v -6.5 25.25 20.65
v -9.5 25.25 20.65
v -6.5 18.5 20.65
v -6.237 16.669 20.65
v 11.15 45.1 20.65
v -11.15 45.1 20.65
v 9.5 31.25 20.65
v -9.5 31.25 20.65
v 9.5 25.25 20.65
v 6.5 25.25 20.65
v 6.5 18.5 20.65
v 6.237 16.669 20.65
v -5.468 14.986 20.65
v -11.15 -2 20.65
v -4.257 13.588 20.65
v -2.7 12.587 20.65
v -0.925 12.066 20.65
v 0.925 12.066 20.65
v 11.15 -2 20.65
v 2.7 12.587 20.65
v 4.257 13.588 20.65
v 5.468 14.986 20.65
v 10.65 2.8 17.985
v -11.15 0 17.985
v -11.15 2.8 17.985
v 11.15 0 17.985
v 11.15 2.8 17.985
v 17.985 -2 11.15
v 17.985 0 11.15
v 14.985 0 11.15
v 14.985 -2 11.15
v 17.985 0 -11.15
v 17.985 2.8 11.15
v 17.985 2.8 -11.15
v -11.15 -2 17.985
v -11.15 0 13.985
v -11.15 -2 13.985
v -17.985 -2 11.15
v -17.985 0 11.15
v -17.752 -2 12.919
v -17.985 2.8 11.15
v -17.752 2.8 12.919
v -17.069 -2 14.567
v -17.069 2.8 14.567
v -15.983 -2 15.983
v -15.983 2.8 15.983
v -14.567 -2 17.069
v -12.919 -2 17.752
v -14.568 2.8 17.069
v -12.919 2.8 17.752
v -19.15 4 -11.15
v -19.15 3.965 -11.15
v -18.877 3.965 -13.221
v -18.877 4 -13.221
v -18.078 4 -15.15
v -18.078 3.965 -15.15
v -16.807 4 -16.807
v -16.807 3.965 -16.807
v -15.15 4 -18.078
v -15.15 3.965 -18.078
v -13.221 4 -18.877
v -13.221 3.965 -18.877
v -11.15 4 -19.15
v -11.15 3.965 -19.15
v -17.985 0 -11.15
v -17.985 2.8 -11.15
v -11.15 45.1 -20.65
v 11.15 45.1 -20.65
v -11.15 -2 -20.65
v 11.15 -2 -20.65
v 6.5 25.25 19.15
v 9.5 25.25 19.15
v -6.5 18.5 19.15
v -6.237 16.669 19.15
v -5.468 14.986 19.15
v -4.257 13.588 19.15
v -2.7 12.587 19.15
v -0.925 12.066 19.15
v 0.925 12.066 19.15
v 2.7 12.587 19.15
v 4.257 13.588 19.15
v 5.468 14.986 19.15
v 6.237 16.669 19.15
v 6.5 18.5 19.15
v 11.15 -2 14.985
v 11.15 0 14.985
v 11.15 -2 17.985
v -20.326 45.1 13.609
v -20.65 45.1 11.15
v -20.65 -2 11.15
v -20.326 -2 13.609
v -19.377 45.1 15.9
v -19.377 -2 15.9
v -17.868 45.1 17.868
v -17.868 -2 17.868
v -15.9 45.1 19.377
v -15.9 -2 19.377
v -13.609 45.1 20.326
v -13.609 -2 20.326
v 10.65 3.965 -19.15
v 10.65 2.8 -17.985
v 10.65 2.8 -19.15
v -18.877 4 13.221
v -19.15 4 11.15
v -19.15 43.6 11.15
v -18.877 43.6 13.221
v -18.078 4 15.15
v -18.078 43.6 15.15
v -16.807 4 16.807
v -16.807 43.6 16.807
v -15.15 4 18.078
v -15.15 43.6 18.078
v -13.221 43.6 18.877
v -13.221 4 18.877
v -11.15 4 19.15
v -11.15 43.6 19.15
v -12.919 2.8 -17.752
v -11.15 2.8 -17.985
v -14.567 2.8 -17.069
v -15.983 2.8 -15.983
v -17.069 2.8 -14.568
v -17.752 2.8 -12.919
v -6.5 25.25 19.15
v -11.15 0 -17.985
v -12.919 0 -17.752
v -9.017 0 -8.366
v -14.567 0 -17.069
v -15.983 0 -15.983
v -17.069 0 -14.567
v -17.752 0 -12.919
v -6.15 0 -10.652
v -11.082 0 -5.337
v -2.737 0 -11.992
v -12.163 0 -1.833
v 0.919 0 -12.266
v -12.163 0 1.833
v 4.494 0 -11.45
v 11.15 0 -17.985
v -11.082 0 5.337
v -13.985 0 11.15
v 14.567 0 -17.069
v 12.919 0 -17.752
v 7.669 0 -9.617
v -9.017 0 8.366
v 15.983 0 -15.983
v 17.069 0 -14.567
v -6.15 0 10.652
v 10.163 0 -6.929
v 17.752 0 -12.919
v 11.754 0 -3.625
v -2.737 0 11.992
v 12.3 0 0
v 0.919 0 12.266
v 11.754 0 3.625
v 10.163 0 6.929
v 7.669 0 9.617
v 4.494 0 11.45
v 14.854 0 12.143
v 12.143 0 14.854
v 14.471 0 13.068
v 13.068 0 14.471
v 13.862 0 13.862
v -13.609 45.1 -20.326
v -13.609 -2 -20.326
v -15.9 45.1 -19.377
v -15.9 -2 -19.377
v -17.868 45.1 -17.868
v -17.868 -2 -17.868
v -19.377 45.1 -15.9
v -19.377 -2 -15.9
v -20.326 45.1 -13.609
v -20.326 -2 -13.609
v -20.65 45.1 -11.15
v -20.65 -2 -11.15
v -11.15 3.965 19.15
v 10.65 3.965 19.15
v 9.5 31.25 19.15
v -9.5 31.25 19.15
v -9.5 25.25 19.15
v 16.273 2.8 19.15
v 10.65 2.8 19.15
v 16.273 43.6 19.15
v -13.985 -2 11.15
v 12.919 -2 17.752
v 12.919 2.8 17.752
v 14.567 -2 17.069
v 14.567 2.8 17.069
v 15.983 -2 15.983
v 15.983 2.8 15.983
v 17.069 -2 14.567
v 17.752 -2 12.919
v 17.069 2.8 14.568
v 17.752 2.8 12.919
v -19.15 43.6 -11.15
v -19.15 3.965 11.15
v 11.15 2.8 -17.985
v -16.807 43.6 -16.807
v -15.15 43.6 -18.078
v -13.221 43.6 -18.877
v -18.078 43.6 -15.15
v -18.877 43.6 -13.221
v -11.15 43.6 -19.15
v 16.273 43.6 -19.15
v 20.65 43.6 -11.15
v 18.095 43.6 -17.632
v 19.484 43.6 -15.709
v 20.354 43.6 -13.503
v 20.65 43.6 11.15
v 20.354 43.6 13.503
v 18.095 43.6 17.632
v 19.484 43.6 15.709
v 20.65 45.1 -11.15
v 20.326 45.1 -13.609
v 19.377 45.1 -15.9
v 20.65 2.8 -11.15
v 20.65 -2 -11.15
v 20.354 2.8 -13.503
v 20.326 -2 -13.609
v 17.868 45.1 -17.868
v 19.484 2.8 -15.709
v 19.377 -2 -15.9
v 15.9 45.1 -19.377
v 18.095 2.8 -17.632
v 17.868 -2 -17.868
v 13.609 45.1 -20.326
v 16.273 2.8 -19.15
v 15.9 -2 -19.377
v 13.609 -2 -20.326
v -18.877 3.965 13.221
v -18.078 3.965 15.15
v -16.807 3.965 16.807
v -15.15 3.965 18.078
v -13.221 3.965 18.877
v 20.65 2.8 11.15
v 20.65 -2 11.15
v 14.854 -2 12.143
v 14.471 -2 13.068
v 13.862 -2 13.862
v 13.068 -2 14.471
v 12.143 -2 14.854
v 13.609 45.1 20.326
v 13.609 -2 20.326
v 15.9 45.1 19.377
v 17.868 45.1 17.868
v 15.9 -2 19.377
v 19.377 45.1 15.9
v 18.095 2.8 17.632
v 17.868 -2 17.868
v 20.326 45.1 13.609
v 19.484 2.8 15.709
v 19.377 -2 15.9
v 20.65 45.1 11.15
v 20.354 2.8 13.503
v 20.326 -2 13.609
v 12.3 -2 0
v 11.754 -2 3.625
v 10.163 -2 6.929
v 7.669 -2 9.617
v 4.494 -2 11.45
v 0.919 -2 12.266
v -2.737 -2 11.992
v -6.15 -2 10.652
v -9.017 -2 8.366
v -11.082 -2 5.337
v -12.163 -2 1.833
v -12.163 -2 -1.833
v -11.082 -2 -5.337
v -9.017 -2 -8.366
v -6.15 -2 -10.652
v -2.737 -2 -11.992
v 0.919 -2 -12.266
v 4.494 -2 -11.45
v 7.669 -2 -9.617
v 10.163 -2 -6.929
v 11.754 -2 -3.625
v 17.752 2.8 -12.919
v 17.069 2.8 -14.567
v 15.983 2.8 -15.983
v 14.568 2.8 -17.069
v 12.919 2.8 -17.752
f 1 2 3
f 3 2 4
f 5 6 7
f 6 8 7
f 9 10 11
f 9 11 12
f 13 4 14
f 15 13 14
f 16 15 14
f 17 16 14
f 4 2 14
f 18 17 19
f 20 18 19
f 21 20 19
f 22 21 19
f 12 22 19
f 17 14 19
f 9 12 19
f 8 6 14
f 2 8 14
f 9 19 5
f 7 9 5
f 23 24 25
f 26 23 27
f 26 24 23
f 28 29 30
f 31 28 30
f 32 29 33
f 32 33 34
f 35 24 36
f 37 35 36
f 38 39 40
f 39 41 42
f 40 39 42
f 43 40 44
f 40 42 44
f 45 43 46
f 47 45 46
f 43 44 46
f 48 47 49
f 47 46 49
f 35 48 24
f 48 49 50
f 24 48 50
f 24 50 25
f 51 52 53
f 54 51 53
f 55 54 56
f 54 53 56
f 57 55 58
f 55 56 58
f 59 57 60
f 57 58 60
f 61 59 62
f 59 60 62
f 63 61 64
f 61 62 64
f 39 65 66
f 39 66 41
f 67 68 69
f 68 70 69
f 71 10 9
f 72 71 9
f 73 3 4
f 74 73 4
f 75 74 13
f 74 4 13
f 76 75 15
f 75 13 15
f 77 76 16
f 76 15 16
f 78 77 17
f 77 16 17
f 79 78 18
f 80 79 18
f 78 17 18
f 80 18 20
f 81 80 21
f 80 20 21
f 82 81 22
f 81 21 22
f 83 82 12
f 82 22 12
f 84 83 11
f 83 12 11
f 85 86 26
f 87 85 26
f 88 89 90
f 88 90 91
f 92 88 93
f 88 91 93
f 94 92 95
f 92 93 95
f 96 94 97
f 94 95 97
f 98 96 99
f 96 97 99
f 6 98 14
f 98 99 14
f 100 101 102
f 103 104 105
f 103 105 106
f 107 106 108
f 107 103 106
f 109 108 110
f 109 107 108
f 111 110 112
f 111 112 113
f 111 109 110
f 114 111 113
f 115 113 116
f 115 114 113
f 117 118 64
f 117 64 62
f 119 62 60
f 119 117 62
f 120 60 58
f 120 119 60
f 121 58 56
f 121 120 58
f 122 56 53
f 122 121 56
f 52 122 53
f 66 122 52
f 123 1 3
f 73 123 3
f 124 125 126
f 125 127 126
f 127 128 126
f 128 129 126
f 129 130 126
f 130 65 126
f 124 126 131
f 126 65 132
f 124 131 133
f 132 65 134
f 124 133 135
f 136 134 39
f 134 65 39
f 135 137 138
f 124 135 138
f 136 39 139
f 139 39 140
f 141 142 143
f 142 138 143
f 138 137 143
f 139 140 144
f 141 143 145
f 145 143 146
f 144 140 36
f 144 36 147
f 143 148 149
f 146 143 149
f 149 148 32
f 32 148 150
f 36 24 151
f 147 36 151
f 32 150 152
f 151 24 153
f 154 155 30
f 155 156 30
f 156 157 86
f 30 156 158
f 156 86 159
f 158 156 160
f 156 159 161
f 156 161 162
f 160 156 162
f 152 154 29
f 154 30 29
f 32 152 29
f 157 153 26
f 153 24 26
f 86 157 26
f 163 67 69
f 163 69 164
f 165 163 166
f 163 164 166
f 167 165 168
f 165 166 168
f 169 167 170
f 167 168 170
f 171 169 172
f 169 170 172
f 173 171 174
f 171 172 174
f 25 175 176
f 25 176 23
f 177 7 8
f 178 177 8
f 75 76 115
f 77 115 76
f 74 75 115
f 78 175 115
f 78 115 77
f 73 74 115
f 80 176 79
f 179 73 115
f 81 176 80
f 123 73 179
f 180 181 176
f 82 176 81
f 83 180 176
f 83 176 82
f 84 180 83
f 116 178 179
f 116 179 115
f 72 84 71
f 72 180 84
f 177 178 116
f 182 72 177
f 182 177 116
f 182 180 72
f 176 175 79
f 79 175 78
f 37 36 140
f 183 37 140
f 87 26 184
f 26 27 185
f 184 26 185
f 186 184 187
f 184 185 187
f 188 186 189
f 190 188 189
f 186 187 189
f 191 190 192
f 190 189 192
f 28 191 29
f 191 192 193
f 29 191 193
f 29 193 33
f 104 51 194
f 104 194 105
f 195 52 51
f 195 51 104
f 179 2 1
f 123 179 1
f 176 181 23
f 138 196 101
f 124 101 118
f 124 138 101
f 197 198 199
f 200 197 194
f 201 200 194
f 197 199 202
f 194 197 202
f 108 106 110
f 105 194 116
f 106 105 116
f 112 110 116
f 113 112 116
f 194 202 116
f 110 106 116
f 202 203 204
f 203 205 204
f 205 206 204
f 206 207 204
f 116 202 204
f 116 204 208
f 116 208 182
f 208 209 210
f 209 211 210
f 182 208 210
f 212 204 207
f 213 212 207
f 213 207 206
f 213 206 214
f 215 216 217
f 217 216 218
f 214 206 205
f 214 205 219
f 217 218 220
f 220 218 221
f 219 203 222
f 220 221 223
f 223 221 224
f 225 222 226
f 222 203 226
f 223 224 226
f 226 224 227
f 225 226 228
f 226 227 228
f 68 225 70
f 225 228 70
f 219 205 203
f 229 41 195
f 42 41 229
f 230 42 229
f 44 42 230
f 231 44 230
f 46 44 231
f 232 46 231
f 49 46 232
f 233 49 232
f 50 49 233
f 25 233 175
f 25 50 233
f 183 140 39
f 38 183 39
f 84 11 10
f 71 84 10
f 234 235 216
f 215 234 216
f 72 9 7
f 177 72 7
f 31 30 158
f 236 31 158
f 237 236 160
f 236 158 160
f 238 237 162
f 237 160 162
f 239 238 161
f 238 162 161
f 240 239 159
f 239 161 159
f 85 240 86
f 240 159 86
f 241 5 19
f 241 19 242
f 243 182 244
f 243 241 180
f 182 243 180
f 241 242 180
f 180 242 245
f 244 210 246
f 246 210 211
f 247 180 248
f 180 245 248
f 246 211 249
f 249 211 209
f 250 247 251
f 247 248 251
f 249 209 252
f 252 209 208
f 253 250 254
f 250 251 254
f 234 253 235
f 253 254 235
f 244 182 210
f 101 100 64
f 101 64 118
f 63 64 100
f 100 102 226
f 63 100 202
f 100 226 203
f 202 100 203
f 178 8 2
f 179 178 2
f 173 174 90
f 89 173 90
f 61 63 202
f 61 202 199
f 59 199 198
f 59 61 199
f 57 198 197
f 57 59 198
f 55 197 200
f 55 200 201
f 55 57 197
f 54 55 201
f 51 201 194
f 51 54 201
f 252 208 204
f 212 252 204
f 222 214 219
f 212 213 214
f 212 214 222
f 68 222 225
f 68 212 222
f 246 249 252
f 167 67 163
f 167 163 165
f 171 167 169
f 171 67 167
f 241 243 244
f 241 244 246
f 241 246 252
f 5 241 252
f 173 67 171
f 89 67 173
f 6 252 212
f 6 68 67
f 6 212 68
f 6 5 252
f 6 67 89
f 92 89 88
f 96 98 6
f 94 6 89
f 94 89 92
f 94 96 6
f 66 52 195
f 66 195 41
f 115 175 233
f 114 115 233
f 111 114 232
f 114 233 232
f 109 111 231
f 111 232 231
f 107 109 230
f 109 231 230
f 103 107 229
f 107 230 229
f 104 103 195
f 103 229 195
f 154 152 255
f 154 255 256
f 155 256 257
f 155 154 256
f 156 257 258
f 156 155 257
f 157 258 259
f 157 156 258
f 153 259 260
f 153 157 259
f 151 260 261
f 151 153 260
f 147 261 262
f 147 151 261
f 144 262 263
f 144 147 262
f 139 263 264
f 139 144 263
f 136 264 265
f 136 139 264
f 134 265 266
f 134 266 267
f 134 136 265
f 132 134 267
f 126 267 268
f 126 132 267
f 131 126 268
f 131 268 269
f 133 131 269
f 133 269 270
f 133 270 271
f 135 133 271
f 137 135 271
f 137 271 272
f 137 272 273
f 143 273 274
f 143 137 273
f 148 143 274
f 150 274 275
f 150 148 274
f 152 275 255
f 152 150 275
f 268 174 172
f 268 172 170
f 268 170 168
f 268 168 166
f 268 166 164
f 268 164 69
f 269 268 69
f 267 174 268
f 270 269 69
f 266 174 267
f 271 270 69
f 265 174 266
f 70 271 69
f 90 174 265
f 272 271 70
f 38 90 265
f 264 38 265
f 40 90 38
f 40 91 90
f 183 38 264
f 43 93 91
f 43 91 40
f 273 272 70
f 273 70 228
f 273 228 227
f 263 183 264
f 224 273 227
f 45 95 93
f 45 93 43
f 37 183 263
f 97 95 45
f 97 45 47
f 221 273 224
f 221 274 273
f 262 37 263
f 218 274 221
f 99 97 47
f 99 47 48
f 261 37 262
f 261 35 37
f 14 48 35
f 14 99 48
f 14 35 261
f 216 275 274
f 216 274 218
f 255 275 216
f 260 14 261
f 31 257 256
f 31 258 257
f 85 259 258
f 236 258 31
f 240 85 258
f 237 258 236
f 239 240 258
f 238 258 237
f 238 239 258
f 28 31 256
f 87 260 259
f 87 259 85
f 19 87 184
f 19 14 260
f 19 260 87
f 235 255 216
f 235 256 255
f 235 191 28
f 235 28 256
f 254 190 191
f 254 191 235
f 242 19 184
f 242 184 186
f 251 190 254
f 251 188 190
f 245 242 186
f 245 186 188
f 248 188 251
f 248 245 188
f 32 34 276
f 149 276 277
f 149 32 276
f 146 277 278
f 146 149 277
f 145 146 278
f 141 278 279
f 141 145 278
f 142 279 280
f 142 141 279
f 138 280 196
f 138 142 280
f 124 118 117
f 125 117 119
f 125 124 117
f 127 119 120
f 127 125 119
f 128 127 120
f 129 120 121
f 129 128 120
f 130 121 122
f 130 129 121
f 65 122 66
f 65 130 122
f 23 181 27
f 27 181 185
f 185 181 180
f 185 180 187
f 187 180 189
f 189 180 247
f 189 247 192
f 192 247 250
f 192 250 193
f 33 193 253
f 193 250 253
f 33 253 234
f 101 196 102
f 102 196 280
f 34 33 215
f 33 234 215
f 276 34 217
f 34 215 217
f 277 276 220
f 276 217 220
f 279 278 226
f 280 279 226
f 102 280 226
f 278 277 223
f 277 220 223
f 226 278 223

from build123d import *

# Parameters (mm, degrees)
F1_DEPTH     = 43.6
F2_DEPTH     = 4
F3_T1_DEPTH  = 22.3
F3_T6_ANGLE  = 90
F3_S7_R      = 8
F3_T8_DEPTH  = 7
F3_T12_DEPTH = 22.3
F3_T17_ANGLE = 90
F3_S18_R     = 8
F3_T19_DEPTH = 7
F3_T23_DEPTH = 22.3
F3_T28_ANGLE = 90
F3_T33_ANGLE = 90
F3_T38_DEPTH = 22.3
F5_DEPTH     = 5
F6_R         = 12.3
F7_DEPTH     = 2
F9_DEPTH     = 1.5
F10_W        = 40.8
F10_H        = 8
F10_H_2      = 22.3
F11_DEPTH    = 10


# Not quite as in the source:
# - a fillet or chamfer that OpenCascade refuses, or shapes differently, is made with other operations: its cross-section is extruded or revolved along the edge and cut away or added


with BuildPart() as f1:
    # F0 (on Front) → F1 (new body)
    with BuildSketch(Plane.XZ):
        with BuildLine():
            ThreePointArc((20.65, 11.15), (17.8675144213, 17.8675144213), (11.15, 20.65))
            Line((11.15, 20.65), (-11.15, 20.65))
            ThreePointArc((-11.15, 20.65), (-17.8675144213, 17.8675144213), (-20.65, 11.15))
            Line((-20.65, 11.15), (-20.65, -11.15))
            ThreePointArc((-20.65, -11.15), (-17.8675144213, -17.8675144213), (-11.15, -20.65))
            Line((-11.15, -20.65), (11.15, -20.65))
            ThreePointArc((11.15, -20.65), (17.8675144213, -17.8675144213), (20.65, -11.15))
            Line((20.65, -11.15), (20.65, 11.15))
        make_face()
        with BuildLine():
            Line((-11.15, 19.15), (11.15, 19.15))
            ThreePointArc((11.15, 19.15), (16.8068542495, 16.8068542495), (19.15, 11.15))
            Line((19.15, 11.15), (19.15, -11.15))
            ThreePointArc((19.15, -11.15), (16.8068542495, -16.8068542495), (11.15, -19.15))
            Line((11.15, -19.15), (-11.15, -19.15))
            ThreePointArc((-11.15, -19.15), (-16.8068542495, -16.8068542495), (-19.15, -11.15))
            Line((-19.15, -11.15), (-19.15, 11.15))
            ThreePointArc((-19.15, 11.15), (-16.8068542495, 16.8068542495), (-11.15, 19.15))
        make_face(mode=Mode.SUBTRACT)
    extrude(amount=-F1_DEPTH)

    # F0 (on Front) → F2 (join)
    with BuildSketch(Plane.XZ):
        with BuildLine():
            ThreePointArc((20.65, 11.15), (17.8675144213, 17.8675144213), (11.15, 20.65))
            Line((11.15, 20.65), (-11.15, 20.65))
            ThreePointArc((-11.15, 20.65), (-17.8675144213, 17.8675144213), (-20.65, 11.15))
            Line((-20.65, 11.15), (-20.65, -11.15))
            ThreePointArc((-20.65, -11.15), (-17.8675144213, -17.8675144213), (-11.15, -20.65))
            Line((-11.15, -20.65), (11.15, -20.65))
            ThreePointArc((11.15, -20.65), (17.8675144213, -17.8675144213), (20.65, -11.15))
            Line((20.65, -11.15), (20.65, 11.15))
        make_face()
        with BuildLine():
            Line((-11.15, 19.15), (11.15, 19.15))
            ThreePointArc((11.15, 19.15), (16.8068542495, 16.8068542495), (19.15, 11.15))
            Line((19.15, 11.15), (19.15, -11.15))
            ThreePointArc((19.15, -11.15), (16.8068542495, -16.8068542495), (11.15, -19.15))
            Line((11.15, -19.15), (-11.15, -19.15))
            ThreePointArc((-11.15, -19.15), (-16.8068542495, -16.8068542495), (-19.15, -11.15))
            Line((-19.15, -11.15), (-19.15, 11.15))
            ThreePointArc((-19.15, 11.15), (-16.8068542495, 16.8068542495), (-11.15, 19.15))
        make_face(mode=Mode.SUBTRACT)
        with BuildLine():
            ThreePointArc((19.15, 11.15), (16.8068542495, 16.8068542495), (11.15, 19.15))
            Line((11.15, 19.15), (-11.15, 19.15))
            ThreePointArc((-11.15, 19.15), (-16.8068542495, 16.8068542495), (-19.15, 11.15))
            Line((-19.15, 11.15), (-19.15, -11.15))
            ThreePointArc((-19.15, -11.15), (-16.8068542495, -16.8068542495), (-11.15, -19.15))
            Line((-11.15, -19.15), (11.15, -19.15))
            ThreePointArc((11.15, -19.15), (16.8068542495, -16.8068542495), (19.15, -11.15))
            Line((19.15, -11.15), (19.15, 11.15))
        make_face()
        with BuildLine():
            Line((-11.15, 17.985), (11.15, 17.985))
            ThreePointArc((11.15, 17.985), (15.9830748494, 15.9830748494), (17.985, 11.15))
            Line((17.985, 11.15), (17.985, -11.15))
            ThreePointArc((17.985, -11.15), (15.9830748494, -15.9830748494), (11.15, -17.985))
            Line((11.15, -17.985), (-11.15, -17.985))
            ThreePointArc((-11.15, -17.985), (-15.9830748494, -15.9830748494), (-17.985, -11.15))
            Line((-17.985, -11.15), (-17.985, 11.15))
            ThreePointArc((-17.985, 11.15), (-15.9830748494, 15.9830748494), (-11.15, 17.985))
        make_face(mode=Mode.SUBTRACT)
    extrude(amount=-F2_DEPTH)

    # F3: chamfer of 1.2 on 8 edges, made by hand

    # F3_s2 → F3_t1 (cut)
    with BuildSketch(Plane.XY.offset(-11.15)):
        Polygon((19.185, 4), (17.985, 2.8), (17.985, 4), align=None)
    extrude(amount=F3_T1_DEPTH, mode=Mode.SUBTRACT)


with BuildPart() as f3_tool4:
    # F3_s5 → F3_t6 (revolve)
    with BuildSketch(Plane.XY.offset(11.15)):
        Polygon((-19.185, 4), (-17.985, 2.8), (-17.985, 4), align=None)
    revolve(axis=Axis((-11.15, 4, 11.15), (0, 1, 0)), revolution_arc=F3_T6_ANGLE)

    # F3_s7 → F3_t8 (intersect, symmetric)
    with BuildSketch(Plane.XZ.offset(-3.4)):
        with Locations((-11.15, 11.15)):
            Circle(F3_S7_R)
    extrude(amount=F3_T8_DEPTH, both=True, mode=Mode.INTERSECT)


with BuildPart() as f1_1:
    add(f1.part)

    # F3_t3: cut F3_tool4
    add(f3_tool4.part, mode=Mode.SUBTRACT)


with BuildPart() as f3_tool10:
    # F3_s11 → F3_t12 (new body)
    with BuildSketch(Plane.XY.offset(-11.15)):
        Polygon((-19.185, 4), (-17.985, 2.8), (-17.985, 4), align=None)
    extrude(amount=F3_T12_DEPTH)

    split(bisect_by=Plane.YZ.offset(-19.15), keep=Keep.TOP)


with BuildPart() as f1_2:
    add(f1_1.part)

    # F3_t9: cut F3_tool10
    add(f3_tool10.part, mode=Mode.SUBTRACT)


with BuildPart() as f3_tool15:
    # F3_s16 → F3_t17 (revolve)
    with BuildSketch(Plane.YZ.offset(-11.15)):
        Polygon((4, -19.185), (2.8, -17.985), (4, -17.985), align=None)
    revolve(axis=Axis((-11.15, 4, -11.15), (0, 1, 0)), revolution_arc=F3_T17_ANGLE)

    # F3_s18 → F3_t19 (intersect, symmetric)
    with BuildSketch(Plane.XZ.offset(-3.4)):
        with Locations((-11.15, -11.15)):
            Circle(F3_S18_R)
    extrude(amount=F3_T19_DEPTH, both=True, mode=Mode.INTERSECT)


with BuildPart() as f1_3:
    add(f1_2.part)

    # F3_t14: cut F3_tool15
    add(f3_tool15.part, mode=Mode.SUBTRACT)


with BuildPart() as f3_tool21:
    # F3_s22 → F3_t23 (new body)
    with BuildSketch(Plane.YZ.offset(11.15)):
        Polygon((4, -19.185), (2.8, -17.985), (4, -17.985), align=None)
    extrude(amount=-F3_T23_DEPTH)

    split(bisect_by=Plane.XY.offset(-19.15), keep=Keep.TOP)


with BuildPart() as f1_4:
    add(f1_3.part)

    # F3_t20: cut F3_tool21
    add(f3_tool21.part, mode=Mode.SUBTRACT)


with BuildPart() as f3_tool26:
    # F3_s27 → F3_t28 (revolve)
    with BuildSketch(Plane.XY.offset(-11.15)):
        Polygon((19.185, 4), (17.985, 2.8), (17.985, 4), align=None)
    revolve(axis=Axis((11.15, 4, -11.15), (0, 1, 0)), revolution_arc=F3_T28_ANGLE)

    split(bisect_by=Plane.XY.offset(-19.15), keep=Keep.TOP)


with BuildPart() as f1_5:
    add(f1_4.part)

    # F3_t25: cut F3_tool26
    add(f3_tool26.part, mode=Mode.SUBTRACT)


with BuildPart() as f3_tool31:
    # F3_s32 → F3_t33 (revolve)
    with BuildSketch(Plane.YZ.offset(11.15)):
        Polygon((4, 19.185), (2.8, 17.985), (4, 17.985), align=None)
    revolve(axis=Axis((11.15, 4, 11.15), (0, 1, 0)), revolution_arc=F3_T33_ANGLE)

    split(bisect_by=Plane.XY.offset(19.15), keep=Keep.BOTTOM)


with BuildPart() as f1_6:
    add(f1_5.part)

    # F3_t30: cut F3_tool31
    add(f3_tool31.part, mode=Mode.SUBTRACT)


with BuildPart() as f3_tool36:
    # F3_s37 → F3_t38 (new body)
    with BuildSketch(Plane.YZ.offset(-11.15)):
        Polygon((4, 19.185), (2.8, 17.985), (4, 17.985), align=None)
    extrude(amount=F3_T38_DEPTH)

    split(bisect_by=Plane.XY.offset(19.15), keep=Keep.BOTTOM)


with BuildPart() as f1_7:
    add(f1_6.part)

    # F3_t35: cut F3_tool36
    add(f3_tool36.part, mode=Mode.SUBTRACT)

    # F4 (on face) → F5 (cut)
    with BuildSketch(Plane.XY.offset(20.65)):
        Polygon((-6.5, 25.25), (6.5, 25.25), (9.5, 25.25), (9.5, 31.25), (-9.5, 31.25), (-9.5, 25.25), align=None)
        with BuildLine():
            ThreePointArc((-6.5, 18.5), (0, 12), (6.5, 18.5))
            ThreePointArc((6.5, 18.5), (0, 25), (-6.5, 18.5))
        make_face()
        with BuildLine():
            ThreePointArc((-6.5, 18.5), (0, 25), (6.5, 18.5))
            Line((6.5, 18.5), (6.5, 25.25))
            Line((6.5, 25.25), (-6.5, 25.25))
            Line((-6.5, 25.25), (-6.5, 18.5))
        make_face()
    extrude(amount=-F5_DEPTH, mode=Mode.SUBTRACT)

    # F6 (on face) → F7 (join)
    with BuildSketch(Plane.XZ):
        with BuildLine():
            Line((20.65, -11.15), (20.65, 11.15))
            ThreePointArc((20.65, 11.15), (17.8675144213, 17.8675144213), (11.15, 20.65))
            Line((11.15, 20.65), (-11.15, 20.65))
            ThreePointArc((-11.15, 20.65), (-17.8675144213, 17.8675144213), (-20.65, 11.15))
            Line((-20.65, 11.15), (-20.65, -11.15))
            ThreePointArc((-20.65, -11.15), (-17.8675144213, -17.8675144213), (-11.15, -20.65))
            Line((-11.15, -20.65), (11.15, -20.65))
            ThreePointArc((11.15, -20.65), (17.8675144213, -17.8675144213), (20.65, -11.15))
        make_face()
        with BuildLine():
            ThreePointArc((11.15, 17.985), (15.9830748494, 15.9830748494), (17.985, 11.15))
            Line((17.985, 11.15), (17.985, -11.15))
            ThreePointArc((17.985, -11.15), (15.9830748494, -15.9830748494), (11.15, -17.985))
            Line((11.15, -17.985), (-11.15, -17.985))
            ThreePointArc((-11.15, -17.985), (-15.9830748494, -15.9830748494), (-17.985, -11.15))
            Line((-17.985, -11.15), (-17.985, 11.15))
            ThreePointArc((-17.985, 11.15), (-15.9830748494, 15.9830748494), (-11.15, 17.985))
            Line((-11.15, 17.985), (11.15, 17.985))
        make_face(mode=Mode.SUBTRACT)
        with BuildLine():
            Line((17.985, 11.15), (14.985, 11.15))
            ThreePointArc((14.985, 11.15), (13.8617545059, 13.8617545059), (11.15, 14.985))
            Line((11.15, 14.985), (11.15, 17.985))
            Line((11.15, 17.985), (-11.15, 17.985))
            Line((-11.15, 17.985), (-11.15, 13.985))
            Line((-11.15, 13.985), (-13.985, 11.15))
            Line((-13.985, 11.15), (-17.985, 11.15))
            Line((-17.985, 11.15), (-17.985, -11.15))
            ThreePointArc((-17.985, -11.15), (-15.9830748494, -15.9830748494), (-11.15, -17.985))
            Line((-11.15, -17.985), (11.15, -17.985))
            ThreePointArc((11.15, -17.985), (15.9830748494, -15.9830748494), (17.985, -11.15))
            Line((17.985, -11.15), (17.985, 11.15))
        make_face()
        Circle(F6_R, mode=Mode.SUBTRACT)
    extrude(amount=F7_DEPTH)

    # F8 (on face) → F9 (join)
    with BuildSketch(Plane(origin=(0, 43.6, 0), x_dir=(-1, 0, 0), z_dir=(0, 1, 0))):
        with BuildLine():
            Line((11.15, 20.65), (-11.15, 20.65))
            ThreePointArc((-11.15, 20.65), (-17.8675144213, 17.8675144213), (-20.65, 11.15))
            Line((-20.65, 11.15), (-20.65, -11.15))
            ThreePointArc((-20.65, -11.15), (-17.8675144213, -17.8675144213), (-11.15, -20.65))
            Line((-11.15, -20.65), (11.15, -20.65))
            ThreePointArc((11.15, -20.65), (17.8675144213, -17.8675144213), (20.65, -11.15))
            Line((20.65, -11.15), (20.65, 11.15))
            ThreePointArc((20.65, 11.15), (17.8675144213, 17.8675144213), (11.15, 20.65))
        make_face()
        with BuildLine():
            ThreePointArc((-19.15, 11.15), (-16.8068542495, 16.8068542495), (-11.15, 19.15))
            Line((-11.15, 19.15), (11.15, 19.15))
            ThreePointArc((11.15, 19.15), (16.8068542495, 16.8068542495), (19.15, 11.15))
            Line((19.15, 11.15), (19.15, -11.15))
            ThreePointArc((19.15, -11.15), (16.8068542495, -16.8068542495), (11.15, -19.15))
            Line((11.15, -19.15), (-11.15, -19.15))
            ThreePointArc((-11.15, -19.15), (-16.8068542495, -16.8068542495), (-19.15, -11.15))
            Line((-19.15, -11.15), (-19.15, 11.15))
        make_face(mode=Mode.SUBTRACT)
        with BuildLine():
            Line((11.15, 19.15), (-11.15, 19.15))
            ThreePointArc((-11.15, 19.15), (-16.8068542495, 16.8068542495), (-19.15, 11.15))
            Line((-19.15, 11.15), (-19.15, -11.15))
            ThreePointArc((-19.15, -11.15), (-16.8068542495, -16.8068542495), (-11.15, -19.15))
            Line((-11.15, -19.15), (11.15, -19.15))
            ThreePointArc((11.15, -19.15), (16.8068542495, -16.8068542495), (19.15, -11.15))
            Line((19.15, -11.15), (19.15, 11.15))
            ThreePointArc((19.15, 11.15), (16.8068542495, 16.8068542495), (11.15, 19.15))
        make_face()
    extrude(amount=F9_DEPTH)

    # F10 (on face) → F11 (cut)
    with BuildSketch(Plane.YZ.offset(20.65)):
        with Locations((23.2, 15.15)):
            Rectangle(F10_W, F10_H)
        with Locations((23.2, 0)):
            Rectangle(F10_W, F10_H_2)
        with Locations((23.2, -15.15)):
            Rectangle(F10_W, F10_H)
    extrude(amount=-F11_DEPTH, mode=Mode.SUBTRACT)


solid = f1_7.part
